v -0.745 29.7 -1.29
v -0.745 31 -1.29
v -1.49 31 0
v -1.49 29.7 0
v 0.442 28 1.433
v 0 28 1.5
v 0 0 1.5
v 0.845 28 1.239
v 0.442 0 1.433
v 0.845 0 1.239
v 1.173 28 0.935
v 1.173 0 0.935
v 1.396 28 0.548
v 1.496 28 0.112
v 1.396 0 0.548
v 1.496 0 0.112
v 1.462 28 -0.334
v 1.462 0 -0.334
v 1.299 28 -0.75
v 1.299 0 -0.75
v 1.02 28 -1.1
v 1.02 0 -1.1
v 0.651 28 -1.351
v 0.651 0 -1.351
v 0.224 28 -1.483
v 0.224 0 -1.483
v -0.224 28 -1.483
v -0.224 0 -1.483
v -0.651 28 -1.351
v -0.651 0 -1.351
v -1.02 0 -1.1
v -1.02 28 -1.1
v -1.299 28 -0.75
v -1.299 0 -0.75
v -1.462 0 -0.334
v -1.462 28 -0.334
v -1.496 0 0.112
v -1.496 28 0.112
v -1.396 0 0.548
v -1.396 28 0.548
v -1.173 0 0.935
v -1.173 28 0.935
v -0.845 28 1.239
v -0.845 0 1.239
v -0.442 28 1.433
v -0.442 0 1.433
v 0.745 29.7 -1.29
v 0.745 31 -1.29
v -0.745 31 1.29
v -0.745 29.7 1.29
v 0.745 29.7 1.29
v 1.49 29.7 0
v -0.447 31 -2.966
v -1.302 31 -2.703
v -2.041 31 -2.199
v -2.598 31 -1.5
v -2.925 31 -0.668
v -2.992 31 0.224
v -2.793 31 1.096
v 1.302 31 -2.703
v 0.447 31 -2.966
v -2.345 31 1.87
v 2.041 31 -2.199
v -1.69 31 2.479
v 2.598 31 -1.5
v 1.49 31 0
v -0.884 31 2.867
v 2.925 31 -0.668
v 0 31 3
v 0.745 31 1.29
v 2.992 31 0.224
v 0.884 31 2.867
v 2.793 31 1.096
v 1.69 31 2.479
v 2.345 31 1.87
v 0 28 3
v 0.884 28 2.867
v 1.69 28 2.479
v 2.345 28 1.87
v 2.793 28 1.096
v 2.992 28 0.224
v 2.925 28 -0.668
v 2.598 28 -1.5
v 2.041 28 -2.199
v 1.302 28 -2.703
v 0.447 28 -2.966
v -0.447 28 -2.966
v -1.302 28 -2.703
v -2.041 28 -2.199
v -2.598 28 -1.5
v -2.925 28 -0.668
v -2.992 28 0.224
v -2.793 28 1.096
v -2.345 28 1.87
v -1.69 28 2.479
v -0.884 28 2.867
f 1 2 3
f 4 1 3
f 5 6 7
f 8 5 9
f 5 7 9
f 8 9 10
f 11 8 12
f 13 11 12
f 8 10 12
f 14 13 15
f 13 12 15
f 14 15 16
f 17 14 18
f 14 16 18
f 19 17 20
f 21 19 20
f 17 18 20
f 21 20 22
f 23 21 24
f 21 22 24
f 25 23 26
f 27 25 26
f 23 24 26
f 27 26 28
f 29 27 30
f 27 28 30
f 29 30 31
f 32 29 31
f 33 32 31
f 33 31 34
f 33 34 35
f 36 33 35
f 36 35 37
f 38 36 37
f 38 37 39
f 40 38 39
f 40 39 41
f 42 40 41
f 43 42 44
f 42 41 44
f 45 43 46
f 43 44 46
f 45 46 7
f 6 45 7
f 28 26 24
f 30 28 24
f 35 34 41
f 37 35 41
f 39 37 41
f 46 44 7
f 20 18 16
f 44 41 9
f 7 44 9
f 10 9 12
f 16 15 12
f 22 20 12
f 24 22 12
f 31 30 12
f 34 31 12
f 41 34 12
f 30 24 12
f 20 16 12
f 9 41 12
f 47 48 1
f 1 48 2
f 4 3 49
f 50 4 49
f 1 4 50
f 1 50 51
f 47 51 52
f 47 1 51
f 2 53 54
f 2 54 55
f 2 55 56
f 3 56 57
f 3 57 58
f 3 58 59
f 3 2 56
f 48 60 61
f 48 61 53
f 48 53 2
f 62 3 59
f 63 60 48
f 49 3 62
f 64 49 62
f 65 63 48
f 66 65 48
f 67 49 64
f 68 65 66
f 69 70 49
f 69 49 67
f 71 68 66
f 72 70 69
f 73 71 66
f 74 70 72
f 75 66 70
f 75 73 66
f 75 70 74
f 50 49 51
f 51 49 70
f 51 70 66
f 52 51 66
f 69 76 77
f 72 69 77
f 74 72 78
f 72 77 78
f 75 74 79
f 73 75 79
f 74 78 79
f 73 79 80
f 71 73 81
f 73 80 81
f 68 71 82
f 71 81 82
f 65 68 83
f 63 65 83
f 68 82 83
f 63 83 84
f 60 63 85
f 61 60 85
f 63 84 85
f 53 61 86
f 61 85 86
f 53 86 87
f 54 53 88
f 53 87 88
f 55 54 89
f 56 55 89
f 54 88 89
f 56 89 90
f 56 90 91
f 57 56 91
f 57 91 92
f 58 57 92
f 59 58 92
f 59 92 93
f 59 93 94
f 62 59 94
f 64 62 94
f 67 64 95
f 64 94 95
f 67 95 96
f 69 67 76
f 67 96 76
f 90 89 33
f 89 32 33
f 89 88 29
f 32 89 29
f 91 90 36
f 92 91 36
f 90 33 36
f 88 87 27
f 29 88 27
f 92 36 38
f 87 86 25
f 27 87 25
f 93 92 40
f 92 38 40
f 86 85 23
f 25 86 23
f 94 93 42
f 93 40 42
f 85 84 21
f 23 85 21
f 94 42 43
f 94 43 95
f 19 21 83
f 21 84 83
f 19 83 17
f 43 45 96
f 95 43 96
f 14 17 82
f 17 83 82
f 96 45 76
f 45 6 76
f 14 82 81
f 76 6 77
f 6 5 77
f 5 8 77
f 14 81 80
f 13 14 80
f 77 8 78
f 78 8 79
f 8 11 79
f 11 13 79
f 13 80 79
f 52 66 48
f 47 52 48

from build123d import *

# Parameters (mm, degrees)
SKETCH1_R           = 1.5
SCREWSHAFT_DEPTH    = 28
SKETCH2_R           = 3
BOSS_EXTRUDE2_DEPTH = 3
CUT_EXTRUDE1_DEPTH  = 1.3


with BuildPart() as part:
    # Sketch1 → ScrewShaft (new body)
    with BuildSketch(Plane(origin=(0, 0, 0), x_dir=(1, 0, 0), z_dir=(0, 1, 0))):
        with Locations(Location((0, 0, 0), (0, 0, 270))):
            Circle(SKETCH1_R)
    extrude(amount=SCREWSHAFT_DEPTH)

    # Sketch2 → Boss-Extrude2 (add)
    with BuildSketch(Plane(origin=(0, 28, 0), x_dir=(1, 0, 0), z_dir=(0, 1, 0))):
        with Locations(Location((0, 0, 0), (0, 0, 270))):
            Circle(SKETCH2_R)
    extrude(amount=BOSS_EXTRUDE2_DEPTH)

    # Sketch3 → Cut-Extrude1 (cut)
    with BuildSketch(Plane(origin=(0, 31, 0), x_dir=(1, 0, 0), z_dir=(0, 1, 0))):
        Polygon((1.489563695, 0), (0.744781847, 1.29), (-0.744781847, 1.29), (-1.489563695, 0), (-0.744781847, -1.29), (0.744781847, -1.29), align=None)
    extrude(amount=-CUT_EXTRUDE1_DEPTH, mode=Mode.SUBTRACT)


solid = part.part
